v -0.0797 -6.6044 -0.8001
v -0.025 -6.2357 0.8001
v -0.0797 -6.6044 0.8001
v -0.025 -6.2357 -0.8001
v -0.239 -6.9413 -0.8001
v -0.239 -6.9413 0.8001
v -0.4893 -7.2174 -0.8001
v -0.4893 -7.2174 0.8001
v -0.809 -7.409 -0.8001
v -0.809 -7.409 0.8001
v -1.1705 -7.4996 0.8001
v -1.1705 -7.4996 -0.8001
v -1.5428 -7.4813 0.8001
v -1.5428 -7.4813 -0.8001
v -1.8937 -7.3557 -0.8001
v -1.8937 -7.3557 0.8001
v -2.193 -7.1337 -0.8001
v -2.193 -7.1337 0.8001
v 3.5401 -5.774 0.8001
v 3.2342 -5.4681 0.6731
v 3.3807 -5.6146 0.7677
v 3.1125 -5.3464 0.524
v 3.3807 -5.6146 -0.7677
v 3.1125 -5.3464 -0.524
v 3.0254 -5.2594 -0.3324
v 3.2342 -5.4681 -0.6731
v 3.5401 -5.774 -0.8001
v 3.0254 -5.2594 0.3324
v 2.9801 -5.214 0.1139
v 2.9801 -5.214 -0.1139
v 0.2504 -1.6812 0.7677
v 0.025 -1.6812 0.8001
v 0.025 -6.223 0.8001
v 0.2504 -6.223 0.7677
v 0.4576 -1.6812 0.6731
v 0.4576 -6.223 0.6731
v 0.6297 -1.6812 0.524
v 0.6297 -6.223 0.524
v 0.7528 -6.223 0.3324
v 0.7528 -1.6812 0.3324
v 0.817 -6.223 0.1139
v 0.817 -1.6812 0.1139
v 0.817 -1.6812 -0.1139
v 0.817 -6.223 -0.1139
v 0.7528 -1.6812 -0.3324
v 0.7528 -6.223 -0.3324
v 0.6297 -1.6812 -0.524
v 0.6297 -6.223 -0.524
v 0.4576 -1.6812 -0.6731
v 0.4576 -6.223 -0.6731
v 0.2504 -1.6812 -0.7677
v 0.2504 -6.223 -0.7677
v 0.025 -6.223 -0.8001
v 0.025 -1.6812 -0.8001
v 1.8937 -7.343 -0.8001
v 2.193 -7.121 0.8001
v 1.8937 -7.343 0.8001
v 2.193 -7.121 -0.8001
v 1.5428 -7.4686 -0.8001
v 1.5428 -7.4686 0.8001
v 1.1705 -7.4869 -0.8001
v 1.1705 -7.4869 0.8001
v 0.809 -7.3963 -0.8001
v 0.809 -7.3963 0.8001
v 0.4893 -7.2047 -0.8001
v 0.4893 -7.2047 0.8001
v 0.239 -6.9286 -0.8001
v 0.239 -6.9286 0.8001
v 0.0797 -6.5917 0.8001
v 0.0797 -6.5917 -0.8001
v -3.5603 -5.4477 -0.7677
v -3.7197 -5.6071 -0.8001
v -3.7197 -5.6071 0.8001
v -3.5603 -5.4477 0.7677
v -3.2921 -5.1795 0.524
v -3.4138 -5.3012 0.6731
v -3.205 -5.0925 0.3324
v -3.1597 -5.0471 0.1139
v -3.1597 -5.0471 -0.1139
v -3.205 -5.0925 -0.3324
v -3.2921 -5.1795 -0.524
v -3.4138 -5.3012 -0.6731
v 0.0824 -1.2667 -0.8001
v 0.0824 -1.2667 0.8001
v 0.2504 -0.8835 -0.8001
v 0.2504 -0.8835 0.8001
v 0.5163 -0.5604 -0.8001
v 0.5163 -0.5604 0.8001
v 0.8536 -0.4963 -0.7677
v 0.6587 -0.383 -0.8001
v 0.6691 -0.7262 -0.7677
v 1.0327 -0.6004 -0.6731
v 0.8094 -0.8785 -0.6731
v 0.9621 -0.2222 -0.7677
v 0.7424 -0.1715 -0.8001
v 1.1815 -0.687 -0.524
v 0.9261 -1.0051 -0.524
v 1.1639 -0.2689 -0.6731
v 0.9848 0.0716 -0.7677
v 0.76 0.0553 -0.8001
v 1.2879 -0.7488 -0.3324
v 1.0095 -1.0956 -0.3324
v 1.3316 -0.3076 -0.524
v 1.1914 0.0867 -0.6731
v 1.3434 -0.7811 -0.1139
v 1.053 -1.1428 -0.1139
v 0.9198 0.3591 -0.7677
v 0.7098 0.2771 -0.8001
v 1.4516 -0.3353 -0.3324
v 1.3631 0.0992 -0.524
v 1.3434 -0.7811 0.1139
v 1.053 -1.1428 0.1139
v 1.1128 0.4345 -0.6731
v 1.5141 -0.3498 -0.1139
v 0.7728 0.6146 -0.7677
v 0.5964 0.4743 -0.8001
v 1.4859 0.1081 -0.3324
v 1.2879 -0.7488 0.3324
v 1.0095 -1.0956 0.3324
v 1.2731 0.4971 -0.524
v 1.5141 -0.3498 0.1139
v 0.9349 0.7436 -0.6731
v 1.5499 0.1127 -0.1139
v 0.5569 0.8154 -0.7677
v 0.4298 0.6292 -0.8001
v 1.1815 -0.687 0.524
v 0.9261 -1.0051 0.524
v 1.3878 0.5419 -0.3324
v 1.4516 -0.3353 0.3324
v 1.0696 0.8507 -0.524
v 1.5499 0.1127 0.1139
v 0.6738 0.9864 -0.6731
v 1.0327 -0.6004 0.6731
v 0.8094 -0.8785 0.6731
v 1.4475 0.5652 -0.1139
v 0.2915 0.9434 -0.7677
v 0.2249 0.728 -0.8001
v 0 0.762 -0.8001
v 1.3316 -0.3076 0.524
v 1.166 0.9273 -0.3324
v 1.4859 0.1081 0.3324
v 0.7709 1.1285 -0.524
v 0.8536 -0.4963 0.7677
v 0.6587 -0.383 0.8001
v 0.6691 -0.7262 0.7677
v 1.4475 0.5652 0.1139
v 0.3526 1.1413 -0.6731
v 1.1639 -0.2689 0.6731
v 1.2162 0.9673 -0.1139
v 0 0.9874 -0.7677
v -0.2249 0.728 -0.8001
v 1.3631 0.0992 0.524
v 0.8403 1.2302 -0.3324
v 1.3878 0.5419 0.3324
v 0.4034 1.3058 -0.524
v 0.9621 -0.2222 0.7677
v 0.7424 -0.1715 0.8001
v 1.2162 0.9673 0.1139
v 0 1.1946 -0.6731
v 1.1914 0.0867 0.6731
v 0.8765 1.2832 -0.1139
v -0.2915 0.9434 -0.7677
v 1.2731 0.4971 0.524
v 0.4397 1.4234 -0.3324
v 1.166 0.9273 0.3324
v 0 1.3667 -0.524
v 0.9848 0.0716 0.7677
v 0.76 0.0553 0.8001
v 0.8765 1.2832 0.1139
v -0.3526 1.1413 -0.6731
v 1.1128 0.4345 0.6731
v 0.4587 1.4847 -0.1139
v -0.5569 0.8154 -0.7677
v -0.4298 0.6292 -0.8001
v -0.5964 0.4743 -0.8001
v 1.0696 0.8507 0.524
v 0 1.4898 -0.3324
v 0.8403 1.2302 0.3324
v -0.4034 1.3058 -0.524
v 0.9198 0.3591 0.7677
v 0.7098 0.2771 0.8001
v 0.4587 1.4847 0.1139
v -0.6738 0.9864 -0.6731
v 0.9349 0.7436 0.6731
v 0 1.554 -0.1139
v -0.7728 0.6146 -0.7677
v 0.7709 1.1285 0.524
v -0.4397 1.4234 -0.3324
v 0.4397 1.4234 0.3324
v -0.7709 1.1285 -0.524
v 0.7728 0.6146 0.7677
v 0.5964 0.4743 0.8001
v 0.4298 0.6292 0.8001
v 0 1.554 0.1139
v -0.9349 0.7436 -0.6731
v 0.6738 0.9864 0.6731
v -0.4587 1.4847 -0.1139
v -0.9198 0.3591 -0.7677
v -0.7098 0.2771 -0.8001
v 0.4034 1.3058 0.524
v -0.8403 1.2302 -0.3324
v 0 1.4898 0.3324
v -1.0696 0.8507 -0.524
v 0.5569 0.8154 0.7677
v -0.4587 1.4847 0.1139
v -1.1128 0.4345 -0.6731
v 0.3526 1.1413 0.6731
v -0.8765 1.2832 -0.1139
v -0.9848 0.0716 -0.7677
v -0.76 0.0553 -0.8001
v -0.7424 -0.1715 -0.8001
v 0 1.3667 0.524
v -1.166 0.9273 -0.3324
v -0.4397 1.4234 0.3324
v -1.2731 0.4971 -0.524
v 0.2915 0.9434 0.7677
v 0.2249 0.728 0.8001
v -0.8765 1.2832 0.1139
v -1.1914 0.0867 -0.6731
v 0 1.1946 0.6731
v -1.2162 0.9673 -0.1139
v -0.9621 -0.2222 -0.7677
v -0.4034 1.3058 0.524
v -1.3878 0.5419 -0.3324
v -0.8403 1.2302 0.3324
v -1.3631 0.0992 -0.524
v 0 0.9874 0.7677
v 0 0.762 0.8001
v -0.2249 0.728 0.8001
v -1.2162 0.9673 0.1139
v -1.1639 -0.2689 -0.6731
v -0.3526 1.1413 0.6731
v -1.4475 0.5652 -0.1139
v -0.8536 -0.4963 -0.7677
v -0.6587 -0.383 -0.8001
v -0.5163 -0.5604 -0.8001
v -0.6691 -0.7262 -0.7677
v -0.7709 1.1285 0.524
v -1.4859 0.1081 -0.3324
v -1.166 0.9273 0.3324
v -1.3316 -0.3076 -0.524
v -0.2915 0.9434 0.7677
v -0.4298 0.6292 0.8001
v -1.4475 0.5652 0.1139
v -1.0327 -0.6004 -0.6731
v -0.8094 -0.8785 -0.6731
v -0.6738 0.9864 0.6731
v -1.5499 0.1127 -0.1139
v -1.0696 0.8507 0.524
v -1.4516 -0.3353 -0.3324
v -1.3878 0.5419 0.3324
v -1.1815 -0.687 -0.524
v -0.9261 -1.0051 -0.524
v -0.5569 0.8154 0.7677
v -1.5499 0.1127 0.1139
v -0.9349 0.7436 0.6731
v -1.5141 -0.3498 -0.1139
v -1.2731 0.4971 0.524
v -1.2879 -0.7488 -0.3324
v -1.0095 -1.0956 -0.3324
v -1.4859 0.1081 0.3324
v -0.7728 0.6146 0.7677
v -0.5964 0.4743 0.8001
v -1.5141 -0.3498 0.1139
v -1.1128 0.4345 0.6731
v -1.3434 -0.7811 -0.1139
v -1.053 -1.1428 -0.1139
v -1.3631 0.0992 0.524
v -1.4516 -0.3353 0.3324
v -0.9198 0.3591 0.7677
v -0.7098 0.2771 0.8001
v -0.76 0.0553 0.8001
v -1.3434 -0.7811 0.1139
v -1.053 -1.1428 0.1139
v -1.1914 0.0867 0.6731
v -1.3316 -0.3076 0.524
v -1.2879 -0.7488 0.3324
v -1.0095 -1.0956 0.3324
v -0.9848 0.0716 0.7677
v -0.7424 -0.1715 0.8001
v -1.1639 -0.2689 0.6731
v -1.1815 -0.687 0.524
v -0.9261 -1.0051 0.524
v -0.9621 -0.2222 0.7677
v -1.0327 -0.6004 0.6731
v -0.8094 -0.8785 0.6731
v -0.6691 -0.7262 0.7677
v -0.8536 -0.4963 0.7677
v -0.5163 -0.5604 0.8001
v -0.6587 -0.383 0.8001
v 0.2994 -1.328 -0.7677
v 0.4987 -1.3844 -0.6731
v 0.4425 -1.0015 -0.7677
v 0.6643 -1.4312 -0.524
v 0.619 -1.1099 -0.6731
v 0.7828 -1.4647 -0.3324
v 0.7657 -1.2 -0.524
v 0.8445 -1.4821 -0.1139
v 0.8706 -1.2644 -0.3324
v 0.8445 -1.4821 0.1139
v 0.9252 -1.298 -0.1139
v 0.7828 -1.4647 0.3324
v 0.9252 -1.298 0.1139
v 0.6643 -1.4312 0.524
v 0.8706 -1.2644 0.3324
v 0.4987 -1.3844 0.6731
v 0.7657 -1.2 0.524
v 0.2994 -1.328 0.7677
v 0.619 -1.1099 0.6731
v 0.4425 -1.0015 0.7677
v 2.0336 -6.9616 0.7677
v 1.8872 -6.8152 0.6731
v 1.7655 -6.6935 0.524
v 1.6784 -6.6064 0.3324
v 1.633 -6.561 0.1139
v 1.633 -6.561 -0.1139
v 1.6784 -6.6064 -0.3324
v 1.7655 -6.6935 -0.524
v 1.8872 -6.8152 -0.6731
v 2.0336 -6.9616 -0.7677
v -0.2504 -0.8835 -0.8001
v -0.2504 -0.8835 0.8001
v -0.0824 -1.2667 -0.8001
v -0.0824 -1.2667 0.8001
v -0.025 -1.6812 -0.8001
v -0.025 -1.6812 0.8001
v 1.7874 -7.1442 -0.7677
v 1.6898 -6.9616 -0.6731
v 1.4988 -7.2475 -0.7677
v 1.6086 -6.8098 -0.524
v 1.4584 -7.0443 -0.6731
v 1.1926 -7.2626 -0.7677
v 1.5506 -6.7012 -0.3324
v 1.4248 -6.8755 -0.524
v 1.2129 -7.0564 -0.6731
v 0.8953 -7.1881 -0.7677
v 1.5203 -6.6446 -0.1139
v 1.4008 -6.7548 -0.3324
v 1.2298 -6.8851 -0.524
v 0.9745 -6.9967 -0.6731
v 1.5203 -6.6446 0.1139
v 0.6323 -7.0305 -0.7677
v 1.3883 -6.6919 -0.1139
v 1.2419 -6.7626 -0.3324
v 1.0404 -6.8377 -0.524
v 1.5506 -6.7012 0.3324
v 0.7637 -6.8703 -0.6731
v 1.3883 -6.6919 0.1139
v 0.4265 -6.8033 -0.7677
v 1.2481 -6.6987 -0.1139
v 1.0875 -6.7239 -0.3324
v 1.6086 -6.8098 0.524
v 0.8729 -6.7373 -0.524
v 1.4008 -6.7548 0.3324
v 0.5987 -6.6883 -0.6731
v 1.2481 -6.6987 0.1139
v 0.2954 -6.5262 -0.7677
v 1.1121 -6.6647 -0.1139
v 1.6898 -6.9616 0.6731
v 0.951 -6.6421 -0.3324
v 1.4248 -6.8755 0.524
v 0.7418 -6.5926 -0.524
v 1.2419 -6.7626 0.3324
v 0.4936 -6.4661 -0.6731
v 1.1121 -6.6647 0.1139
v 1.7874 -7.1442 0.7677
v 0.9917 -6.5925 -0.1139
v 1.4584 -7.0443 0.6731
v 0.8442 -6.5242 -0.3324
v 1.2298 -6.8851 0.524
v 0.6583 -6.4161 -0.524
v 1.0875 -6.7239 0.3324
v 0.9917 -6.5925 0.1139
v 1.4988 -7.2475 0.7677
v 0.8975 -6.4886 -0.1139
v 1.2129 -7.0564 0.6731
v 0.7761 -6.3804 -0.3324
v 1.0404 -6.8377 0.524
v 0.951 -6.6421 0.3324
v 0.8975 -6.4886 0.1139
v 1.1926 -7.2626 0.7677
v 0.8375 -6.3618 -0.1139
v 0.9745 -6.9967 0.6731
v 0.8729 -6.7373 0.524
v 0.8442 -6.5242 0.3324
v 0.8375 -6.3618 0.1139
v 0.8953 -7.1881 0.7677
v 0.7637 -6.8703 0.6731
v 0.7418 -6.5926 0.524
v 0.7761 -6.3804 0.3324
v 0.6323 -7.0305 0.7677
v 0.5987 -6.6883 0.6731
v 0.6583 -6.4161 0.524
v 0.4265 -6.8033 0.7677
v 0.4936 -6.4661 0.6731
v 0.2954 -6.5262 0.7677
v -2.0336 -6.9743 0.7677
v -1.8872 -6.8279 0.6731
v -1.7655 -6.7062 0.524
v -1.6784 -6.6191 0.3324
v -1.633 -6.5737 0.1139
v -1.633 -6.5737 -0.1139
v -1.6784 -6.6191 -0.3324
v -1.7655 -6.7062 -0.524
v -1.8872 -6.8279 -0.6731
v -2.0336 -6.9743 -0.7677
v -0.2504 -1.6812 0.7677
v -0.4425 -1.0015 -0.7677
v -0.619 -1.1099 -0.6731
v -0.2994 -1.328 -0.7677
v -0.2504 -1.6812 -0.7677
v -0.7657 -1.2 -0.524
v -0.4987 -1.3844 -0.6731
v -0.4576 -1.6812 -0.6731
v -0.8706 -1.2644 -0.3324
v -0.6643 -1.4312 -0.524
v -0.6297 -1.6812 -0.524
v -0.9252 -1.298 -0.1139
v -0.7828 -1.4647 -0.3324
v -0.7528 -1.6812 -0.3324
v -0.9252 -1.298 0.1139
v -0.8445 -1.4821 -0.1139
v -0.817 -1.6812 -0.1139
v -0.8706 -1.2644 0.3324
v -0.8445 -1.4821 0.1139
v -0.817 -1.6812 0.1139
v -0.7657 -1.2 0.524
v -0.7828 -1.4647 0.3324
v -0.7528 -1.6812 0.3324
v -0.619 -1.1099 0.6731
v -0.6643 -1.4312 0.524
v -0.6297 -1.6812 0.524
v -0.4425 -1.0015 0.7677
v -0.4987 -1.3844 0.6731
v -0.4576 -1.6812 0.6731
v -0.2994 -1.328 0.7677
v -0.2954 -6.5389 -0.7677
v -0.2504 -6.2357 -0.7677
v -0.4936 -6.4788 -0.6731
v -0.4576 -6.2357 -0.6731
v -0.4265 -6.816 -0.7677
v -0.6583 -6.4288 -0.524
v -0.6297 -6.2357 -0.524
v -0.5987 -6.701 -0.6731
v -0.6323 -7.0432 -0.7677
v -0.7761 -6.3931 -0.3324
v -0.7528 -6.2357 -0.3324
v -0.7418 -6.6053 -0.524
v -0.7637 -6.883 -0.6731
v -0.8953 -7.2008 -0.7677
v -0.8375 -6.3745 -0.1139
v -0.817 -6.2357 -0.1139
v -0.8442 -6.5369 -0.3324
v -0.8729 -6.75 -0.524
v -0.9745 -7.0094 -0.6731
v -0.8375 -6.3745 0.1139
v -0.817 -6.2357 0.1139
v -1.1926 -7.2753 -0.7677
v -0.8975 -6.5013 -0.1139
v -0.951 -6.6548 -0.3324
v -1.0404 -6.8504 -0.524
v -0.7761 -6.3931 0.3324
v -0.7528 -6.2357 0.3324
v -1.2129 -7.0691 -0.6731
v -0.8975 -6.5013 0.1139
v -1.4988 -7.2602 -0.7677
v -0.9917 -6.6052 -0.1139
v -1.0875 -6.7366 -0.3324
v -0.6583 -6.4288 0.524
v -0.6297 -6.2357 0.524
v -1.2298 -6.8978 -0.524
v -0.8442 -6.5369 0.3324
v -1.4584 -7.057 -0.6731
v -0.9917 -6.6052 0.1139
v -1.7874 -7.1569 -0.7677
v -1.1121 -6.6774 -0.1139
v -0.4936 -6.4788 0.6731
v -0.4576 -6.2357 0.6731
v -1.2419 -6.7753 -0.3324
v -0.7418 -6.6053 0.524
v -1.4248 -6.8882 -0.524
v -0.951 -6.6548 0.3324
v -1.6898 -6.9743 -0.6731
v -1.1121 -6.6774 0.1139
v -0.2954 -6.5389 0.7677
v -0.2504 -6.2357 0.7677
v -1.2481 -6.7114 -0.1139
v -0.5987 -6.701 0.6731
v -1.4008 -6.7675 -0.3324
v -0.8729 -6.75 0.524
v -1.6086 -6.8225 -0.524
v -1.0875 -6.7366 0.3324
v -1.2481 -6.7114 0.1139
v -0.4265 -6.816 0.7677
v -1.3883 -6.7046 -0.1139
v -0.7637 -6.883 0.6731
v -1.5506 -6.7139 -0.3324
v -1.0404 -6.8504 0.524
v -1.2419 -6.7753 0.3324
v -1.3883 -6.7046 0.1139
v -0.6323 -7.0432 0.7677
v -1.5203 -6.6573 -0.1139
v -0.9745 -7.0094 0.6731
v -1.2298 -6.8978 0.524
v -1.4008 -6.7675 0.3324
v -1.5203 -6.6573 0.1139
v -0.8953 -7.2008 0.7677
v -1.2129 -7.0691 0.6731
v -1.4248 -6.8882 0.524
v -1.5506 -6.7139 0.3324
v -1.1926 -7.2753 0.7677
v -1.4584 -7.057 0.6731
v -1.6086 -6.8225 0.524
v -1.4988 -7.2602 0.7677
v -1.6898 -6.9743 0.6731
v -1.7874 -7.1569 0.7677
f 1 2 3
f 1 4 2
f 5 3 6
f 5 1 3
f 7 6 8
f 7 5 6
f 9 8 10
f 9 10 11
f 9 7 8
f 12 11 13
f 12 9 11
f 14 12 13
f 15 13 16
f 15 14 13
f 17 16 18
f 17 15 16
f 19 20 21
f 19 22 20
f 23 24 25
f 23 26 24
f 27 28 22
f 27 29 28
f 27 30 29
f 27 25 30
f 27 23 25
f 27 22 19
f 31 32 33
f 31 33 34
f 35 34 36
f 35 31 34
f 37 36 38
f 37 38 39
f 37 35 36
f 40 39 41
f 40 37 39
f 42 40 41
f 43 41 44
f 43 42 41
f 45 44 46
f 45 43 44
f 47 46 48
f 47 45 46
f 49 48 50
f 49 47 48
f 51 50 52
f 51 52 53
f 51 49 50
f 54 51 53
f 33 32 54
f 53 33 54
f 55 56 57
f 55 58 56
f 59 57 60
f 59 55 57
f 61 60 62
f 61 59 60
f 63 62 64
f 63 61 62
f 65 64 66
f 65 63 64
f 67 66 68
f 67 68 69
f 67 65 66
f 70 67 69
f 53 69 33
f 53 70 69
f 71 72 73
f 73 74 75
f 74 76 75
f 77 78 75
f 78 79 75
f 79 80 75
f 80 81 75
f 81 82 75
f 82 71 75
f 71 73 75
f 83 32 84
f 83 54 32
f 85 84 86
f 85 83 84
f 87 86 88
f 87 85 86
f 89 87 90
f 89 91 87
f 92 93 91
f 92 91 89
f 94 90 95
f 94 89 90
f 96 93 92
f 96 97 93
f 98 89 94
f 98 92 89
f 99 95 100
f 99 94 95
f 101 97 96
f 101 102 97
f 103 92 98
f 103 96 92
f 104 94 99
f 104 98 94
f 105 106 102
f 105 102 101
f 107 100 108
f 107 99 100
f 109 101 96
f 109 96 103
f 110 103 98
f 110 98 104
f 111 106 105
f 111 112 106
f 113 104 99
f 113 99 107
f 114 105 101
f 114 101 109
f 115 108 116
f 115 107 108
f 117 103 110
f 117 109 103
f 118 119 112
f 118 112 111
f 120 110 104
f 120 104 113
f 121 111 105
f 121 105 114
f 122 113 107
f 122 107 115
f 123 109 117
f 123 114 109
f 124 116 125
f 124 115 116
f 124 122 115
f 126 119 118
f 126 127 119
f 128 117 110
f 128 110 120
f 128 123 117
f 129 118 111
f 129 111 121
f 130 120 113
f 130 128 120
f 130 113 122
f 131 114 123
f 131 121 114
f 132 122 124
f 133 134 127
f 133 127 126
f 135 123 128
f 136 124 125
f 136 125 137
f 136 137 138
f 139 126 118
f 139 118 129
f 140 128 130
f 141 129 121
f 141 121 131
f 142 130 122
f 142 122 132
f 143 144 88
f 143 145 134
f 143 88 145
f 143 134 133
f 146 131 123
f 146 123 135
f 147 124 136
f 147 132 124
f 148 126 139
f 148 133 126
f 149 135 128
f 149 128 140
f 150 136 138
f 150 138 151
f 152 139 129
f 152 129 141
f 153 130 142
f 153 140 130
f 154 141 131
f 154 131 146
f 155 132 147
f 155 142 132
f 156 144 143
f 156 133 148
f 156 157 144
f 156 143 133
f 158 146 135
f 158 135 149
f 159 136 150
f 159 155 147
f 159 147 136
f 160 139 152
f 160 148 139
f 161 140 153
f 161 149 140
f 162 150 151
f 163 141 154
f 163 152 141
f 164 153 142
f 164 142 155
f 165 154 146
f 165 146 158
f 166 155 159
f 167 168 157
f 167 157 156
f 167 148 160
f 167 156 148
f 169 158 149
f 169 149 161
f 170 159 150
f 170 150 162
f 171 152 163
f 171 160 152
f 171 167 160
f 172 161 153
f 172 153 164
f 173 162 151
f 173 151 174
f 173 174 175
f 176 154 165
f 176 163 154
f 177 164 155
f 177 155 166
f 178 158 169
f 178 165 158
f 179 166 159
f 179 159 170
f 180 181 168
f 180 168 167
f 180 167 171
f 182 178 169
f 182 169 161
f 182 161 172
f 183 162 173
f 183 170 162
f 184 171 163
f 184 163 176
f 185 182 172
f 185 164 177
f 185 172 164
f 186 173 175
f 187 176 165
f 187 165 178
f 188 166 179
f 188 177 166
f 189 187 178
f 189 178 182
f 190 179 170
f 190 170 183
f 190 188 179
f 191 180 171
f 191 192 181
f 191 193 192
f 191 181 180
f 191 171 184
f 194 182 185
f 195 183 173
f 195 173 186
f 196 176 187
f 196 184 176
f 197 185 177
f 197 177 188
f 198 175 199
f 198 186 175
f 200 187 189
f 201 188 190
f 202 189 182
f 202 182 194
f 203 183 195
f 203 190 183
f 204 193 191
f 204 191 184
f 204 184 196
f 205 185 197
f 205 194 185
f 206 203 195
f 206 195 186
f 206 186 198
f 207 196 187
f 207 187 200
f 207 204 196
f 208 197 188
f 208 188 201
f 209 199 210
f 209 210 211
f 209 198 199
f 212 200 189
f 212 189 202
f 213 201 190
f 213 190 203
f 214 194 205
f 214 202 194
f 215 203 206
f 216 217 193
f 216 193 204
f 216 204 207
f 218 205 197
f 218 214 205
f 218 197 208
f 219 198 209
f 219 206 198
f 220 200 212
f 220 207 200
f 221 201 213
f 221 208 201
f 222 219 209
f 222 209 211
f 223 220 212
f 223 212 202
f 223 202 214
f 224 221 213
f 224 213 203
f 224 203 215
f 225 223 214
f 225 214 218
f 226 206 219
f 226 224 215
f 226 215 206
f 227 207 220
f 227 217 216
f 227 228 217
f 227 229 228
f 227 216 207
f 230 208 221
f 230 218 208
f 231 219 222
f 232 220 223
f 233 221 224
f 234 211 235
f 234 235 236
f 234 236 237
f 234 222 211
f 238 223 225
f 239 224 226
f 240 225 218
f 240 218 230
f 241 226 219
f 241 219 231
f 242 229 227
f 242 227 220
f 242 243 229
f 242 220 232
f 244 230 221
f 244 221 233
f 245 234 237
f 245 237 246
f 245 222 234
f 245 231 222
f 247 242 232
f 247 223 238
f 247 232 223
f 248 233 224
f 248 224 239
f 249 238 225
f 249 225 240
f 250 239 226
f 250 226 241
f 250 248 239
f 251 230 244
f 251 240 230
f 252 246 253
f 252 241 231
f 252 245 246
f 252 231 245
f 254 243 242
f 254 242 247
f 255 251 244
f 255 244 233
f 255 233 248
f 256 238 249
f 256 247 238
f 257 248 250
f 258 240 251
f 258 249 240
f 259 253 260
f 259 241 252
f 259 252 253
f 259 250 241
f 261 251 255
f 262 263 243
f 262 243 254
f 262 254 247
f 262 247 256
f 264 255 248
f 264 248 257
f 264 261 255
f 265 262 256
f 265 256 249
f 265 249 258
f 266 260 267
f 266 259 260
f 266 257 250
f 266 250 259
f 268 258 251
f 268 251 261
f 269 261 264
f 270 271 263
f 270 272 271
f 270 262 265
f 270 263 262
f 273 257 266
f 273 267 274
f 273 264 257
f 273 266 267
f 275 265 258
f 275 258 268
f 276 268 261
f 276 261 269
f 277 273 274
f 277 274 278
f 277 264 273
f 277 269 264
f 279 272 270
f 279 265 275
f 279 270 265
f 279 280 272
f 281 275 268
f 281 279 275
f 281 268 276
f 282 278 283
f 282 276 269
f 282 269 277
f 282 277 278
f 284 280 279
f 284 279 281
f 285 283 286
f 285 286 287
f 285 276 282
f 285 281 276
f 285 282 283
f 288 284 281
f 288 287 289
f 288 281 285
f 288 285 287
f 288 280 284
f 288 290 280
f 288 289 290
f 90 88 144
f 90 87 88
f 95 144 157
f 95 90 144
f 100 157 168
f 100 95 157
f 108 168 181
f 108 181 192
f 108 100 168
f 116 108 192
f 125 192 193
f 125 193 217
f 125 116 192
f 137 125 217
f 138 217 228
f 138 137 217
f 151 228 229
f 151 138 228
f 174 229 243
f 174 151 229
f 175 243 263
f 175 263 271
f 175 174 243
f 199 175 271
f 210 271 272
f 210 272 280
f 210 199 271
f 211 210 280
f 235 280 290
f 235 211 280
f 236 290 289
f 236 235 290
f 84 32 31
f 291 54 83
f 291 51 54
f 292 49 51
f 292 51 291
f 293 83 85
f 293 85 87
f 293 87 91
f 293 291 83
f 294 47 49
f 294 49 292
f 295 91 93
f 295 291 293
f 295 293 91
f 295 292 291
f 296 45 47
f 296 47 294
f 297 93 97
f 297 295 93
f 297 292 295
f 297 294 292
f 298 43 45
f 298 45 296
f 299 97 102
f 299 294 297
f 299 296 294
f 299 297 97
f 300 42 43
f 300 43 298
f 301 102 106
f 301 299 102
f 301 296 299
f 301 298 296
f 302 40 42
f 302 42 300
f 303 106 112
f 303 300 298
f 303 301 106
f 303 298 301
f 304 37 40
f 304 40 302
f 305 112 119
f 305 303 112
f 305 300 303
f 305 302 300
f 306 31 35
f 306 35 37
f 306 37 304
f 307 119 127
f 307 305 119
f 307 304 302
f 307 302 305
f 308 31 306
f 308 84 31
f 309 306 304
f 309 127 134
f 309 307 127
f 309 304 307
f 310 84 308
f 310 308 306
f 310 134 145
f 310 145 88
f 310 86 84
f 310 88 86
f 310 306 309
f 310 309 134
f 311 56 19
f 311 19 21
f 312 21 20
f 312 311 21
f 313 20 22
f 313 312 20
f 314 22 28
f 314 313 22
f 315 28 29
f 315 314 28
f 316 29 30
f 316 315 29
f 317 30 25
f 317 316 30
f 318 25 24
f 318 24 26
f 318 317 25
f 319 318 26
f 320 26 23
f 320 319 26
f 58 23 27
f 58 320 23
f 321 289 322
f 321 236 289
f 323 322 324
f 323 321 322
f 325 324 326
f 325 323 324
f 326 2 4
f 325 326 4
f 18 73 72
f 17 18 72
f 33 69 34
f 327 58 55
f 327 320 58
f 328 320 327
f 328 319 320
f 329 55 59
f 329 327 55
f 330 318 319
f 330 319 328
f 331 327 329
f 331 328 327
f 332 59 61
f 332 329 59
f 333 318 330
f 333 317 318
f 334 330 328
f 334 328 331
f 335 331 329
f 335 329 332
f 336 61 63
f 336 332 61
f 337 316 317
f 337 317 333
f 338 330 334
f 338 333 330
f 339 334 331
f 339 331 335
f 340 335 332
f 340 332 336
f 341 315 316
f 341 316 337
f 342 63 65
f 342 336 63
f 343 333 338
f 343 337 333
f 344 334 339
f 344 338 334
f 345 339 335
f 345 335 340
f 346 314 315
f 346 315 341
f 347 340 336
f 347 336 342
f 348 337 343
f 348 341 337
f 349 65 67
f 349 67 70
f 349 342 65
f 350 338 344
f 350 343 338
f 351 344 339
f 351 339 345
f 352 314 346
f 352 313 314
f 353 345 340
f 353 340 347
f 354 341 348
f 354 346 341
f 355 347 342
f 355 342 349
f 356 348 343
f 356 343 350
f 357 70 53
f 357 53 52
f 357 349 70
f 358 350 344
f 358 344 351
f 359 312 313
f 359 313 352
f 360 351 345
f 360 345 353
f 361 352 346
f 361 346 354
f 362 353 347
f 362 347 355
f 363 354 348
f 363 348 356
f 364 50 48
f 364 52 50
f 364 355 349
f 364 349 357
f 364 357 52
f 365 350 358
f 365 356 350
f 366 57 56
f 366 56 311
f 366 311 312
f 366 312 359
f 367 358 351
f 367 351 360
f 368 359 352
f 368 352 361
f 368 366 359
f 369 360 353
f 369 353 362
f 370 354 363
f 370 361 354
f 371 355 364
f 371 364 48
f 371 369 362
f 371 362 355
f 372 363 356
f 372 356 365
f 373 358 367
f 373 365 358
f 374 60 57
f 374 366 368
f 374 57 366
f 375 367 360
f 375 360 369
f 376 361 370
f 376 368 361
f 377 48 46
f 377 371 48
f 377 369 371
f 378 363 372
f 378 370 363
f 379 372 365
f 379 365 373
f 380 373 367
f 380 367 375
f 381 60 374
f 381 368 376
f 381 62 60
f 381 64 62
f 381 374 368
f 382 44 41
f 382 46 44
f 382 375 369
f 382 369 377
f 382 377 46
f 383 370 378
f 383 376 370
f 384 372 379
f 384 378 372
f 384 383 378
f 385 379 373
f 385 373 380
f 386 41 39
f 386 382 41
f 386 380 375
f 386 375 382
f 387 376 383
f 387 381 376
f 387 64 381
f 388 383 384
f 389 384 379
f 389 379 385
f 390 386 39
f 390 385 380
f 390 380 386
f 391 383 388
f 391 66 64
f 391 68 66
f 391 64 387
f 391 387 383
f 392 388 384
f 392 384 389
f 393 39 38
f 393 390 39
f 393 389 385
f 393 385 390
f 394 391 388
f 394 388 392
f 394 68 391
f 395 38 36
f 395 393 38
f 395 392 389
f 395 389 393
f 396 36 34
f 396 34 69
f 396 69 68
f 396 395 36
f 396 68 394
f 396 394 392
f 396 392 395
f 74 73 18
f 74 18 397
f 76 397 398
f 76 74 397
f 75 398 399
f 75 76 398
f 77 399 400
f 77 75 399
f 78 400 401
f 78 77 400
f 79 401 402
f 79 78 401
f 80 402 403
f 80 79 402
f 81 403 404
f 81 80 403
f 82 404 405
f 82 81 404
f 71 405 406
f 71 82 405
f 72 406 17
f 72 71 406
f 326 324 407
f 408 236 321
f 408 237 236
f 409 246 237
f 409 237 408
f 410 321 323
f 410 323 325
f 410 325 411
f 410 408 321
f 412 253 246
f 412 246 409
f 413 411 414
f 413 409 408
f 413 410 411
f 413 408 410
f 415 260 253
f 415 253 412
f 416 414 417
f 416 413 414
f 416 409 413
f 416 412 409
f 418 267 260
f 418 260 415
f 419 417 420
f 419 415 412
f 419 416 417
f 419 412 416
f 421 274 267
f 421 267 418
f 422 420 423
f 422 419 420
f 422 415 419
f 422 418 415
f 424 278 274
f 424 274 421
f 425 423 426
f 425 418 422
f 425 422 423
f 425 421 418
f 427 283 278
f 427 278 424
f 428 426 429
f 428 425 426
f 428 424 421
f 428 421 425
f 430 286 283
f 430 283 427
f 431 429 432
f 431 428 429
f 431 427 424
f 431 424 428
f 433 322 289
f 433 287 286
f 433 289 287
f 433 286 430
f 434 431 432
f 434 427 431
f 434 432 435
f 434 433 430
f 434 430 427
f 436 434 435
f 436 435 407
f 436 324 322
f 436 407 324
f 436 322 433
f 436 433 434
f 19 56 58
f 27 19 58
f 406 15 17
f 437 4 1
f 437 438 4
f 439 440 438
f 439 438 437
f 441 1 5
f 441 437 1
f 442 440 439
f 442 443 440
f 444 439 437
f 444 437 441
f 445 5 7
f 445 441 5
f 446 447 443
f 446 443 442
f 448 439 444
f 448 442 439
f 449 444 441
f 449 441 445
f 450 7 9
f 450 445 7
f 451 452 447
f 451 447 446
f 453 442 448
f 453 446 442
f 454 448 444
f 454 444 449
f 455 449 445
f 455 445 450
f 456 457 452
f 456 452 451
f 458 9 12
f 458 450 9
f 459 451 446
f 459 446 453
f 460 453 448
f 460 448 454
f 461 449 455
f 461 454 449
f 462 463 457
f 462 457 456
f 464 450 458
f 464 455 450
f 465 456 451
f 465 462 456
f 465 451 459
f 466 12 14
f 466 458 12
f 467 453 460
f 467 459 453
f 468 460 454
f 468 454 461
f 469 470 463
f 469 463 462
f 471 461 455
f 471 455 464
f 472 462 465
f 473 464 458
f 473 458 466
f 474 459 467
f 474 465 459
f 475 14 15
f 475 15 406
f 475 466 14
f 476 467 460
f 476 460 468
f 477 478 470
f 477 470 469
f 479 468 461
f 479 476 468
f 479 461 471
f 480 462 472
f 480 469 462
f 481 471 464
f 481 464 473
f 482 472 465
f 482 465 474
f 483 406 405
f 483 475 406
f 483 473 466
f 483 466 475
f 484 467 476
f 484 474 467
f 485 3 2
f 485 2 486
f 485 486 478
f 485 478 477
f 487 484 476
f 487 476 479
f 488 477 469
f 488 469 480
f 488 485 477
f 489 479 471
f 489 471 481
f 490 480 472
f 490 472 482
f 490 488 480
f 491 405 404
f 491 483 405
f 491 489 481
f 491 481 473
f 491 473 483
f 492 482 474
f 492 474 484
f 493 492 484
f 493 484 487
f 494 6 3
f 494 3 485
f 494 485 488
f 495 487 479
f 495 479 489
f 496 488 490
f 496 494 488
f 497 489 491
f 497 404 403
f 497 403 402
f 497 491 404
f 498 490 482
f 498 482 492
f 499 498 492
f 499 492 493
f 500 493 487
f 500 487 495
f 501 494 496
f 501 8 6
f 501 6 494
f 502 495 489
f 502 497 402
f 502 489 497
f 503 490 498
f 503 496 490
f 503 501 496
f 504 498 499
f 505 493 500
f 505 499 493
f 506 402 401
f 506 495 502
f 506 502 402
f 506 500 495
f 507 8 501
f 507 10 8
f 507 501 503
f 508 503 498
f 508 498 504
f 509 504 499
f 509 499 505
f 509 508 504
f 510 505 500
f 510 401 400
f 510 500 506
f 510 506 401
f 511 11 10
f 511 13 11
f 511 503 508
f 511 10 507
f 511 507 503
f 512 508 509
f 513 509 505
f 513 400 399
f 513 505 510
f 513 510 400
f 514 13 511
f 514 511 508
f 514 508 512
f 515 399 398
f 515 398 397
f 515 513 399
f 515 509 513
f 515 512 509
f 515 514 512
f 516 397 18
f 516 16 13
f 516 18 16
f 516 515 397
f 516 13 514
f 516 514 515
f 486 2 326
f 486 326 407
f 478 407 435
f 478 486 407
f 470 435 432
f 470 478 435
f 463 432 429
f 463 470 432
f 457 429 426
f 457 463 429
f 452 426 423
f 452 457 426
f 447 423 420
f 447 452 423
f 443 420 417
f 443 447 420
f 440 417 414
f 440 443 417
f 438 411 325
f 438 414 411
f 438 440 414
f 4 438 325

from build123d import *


with BuildPart() as part:
    # Pin: sweep along a path in Sketch1
    with BuildLine(Plane.XY) as pin_path:
        Line((0.025, -6.223), (0.025, -1.681188568))
        ThreePointArc((0.025, -1.681188568), (0.153227812, -1.069309495), (0.516333333, -0.560396189))
        ThreePointArc((0.516333333, -0.560396189), (0, 0.762), (-0.516333333, -0.560396189))
        ThreePointArc((-0.516333333, -0.560396189), (-0.153227812, -1.069309495), (-0.025, -1.681188568))
        Line((-0.025, -1.681188568), (-0.025, -6.2357))
        ThreePointArc((-0.025, -6.2357), (-0.808992041, -7.409027006), (-2.193025612, -7.133725612))
        Line((-2.193025612, -7.133725612), (-3.719669153, -5.607082072))
    # Sketch2 → Pin (sweep)
    with BuildSketch(Plane(origin=(0.025, -6.223, 0), x_dir=(1, 0, 0), z_dir=(0, -1, 0))):
        with BuildLine():
            Line((0, 0.8001), (0, -0.8001))
            ThreePointArc((0, -0.8001), (0.8001, 0), (0, 0.8001))
        make_face()
    sweep(path=pin_path.line)

    # Sweep1: sweep along a path in Sketch3
    with BuildLine(Plane.XY) as sweep1_path:
        Line((3.54006403, -5.773987194), (2.193025612, -7.121025612))
        ThreePointArc((2.193025612, -7.121025612), (0.808992041, -7.396327006), (0.025, -6.223))
    # Sketch4 → Sweep1 (sweep)
    with BuildSketch(Plane.XZ.offset(6.223)):
        with BuildLine():
            Line((0.025, 0.8001), (0.025, -0.8001))
            ThreePointArc((0.025, -0.8001), (0.8251, 0), (0.025, 0.8001))
        make_face()
    sweep(path=sweep1_path.line)


solid = part.part
